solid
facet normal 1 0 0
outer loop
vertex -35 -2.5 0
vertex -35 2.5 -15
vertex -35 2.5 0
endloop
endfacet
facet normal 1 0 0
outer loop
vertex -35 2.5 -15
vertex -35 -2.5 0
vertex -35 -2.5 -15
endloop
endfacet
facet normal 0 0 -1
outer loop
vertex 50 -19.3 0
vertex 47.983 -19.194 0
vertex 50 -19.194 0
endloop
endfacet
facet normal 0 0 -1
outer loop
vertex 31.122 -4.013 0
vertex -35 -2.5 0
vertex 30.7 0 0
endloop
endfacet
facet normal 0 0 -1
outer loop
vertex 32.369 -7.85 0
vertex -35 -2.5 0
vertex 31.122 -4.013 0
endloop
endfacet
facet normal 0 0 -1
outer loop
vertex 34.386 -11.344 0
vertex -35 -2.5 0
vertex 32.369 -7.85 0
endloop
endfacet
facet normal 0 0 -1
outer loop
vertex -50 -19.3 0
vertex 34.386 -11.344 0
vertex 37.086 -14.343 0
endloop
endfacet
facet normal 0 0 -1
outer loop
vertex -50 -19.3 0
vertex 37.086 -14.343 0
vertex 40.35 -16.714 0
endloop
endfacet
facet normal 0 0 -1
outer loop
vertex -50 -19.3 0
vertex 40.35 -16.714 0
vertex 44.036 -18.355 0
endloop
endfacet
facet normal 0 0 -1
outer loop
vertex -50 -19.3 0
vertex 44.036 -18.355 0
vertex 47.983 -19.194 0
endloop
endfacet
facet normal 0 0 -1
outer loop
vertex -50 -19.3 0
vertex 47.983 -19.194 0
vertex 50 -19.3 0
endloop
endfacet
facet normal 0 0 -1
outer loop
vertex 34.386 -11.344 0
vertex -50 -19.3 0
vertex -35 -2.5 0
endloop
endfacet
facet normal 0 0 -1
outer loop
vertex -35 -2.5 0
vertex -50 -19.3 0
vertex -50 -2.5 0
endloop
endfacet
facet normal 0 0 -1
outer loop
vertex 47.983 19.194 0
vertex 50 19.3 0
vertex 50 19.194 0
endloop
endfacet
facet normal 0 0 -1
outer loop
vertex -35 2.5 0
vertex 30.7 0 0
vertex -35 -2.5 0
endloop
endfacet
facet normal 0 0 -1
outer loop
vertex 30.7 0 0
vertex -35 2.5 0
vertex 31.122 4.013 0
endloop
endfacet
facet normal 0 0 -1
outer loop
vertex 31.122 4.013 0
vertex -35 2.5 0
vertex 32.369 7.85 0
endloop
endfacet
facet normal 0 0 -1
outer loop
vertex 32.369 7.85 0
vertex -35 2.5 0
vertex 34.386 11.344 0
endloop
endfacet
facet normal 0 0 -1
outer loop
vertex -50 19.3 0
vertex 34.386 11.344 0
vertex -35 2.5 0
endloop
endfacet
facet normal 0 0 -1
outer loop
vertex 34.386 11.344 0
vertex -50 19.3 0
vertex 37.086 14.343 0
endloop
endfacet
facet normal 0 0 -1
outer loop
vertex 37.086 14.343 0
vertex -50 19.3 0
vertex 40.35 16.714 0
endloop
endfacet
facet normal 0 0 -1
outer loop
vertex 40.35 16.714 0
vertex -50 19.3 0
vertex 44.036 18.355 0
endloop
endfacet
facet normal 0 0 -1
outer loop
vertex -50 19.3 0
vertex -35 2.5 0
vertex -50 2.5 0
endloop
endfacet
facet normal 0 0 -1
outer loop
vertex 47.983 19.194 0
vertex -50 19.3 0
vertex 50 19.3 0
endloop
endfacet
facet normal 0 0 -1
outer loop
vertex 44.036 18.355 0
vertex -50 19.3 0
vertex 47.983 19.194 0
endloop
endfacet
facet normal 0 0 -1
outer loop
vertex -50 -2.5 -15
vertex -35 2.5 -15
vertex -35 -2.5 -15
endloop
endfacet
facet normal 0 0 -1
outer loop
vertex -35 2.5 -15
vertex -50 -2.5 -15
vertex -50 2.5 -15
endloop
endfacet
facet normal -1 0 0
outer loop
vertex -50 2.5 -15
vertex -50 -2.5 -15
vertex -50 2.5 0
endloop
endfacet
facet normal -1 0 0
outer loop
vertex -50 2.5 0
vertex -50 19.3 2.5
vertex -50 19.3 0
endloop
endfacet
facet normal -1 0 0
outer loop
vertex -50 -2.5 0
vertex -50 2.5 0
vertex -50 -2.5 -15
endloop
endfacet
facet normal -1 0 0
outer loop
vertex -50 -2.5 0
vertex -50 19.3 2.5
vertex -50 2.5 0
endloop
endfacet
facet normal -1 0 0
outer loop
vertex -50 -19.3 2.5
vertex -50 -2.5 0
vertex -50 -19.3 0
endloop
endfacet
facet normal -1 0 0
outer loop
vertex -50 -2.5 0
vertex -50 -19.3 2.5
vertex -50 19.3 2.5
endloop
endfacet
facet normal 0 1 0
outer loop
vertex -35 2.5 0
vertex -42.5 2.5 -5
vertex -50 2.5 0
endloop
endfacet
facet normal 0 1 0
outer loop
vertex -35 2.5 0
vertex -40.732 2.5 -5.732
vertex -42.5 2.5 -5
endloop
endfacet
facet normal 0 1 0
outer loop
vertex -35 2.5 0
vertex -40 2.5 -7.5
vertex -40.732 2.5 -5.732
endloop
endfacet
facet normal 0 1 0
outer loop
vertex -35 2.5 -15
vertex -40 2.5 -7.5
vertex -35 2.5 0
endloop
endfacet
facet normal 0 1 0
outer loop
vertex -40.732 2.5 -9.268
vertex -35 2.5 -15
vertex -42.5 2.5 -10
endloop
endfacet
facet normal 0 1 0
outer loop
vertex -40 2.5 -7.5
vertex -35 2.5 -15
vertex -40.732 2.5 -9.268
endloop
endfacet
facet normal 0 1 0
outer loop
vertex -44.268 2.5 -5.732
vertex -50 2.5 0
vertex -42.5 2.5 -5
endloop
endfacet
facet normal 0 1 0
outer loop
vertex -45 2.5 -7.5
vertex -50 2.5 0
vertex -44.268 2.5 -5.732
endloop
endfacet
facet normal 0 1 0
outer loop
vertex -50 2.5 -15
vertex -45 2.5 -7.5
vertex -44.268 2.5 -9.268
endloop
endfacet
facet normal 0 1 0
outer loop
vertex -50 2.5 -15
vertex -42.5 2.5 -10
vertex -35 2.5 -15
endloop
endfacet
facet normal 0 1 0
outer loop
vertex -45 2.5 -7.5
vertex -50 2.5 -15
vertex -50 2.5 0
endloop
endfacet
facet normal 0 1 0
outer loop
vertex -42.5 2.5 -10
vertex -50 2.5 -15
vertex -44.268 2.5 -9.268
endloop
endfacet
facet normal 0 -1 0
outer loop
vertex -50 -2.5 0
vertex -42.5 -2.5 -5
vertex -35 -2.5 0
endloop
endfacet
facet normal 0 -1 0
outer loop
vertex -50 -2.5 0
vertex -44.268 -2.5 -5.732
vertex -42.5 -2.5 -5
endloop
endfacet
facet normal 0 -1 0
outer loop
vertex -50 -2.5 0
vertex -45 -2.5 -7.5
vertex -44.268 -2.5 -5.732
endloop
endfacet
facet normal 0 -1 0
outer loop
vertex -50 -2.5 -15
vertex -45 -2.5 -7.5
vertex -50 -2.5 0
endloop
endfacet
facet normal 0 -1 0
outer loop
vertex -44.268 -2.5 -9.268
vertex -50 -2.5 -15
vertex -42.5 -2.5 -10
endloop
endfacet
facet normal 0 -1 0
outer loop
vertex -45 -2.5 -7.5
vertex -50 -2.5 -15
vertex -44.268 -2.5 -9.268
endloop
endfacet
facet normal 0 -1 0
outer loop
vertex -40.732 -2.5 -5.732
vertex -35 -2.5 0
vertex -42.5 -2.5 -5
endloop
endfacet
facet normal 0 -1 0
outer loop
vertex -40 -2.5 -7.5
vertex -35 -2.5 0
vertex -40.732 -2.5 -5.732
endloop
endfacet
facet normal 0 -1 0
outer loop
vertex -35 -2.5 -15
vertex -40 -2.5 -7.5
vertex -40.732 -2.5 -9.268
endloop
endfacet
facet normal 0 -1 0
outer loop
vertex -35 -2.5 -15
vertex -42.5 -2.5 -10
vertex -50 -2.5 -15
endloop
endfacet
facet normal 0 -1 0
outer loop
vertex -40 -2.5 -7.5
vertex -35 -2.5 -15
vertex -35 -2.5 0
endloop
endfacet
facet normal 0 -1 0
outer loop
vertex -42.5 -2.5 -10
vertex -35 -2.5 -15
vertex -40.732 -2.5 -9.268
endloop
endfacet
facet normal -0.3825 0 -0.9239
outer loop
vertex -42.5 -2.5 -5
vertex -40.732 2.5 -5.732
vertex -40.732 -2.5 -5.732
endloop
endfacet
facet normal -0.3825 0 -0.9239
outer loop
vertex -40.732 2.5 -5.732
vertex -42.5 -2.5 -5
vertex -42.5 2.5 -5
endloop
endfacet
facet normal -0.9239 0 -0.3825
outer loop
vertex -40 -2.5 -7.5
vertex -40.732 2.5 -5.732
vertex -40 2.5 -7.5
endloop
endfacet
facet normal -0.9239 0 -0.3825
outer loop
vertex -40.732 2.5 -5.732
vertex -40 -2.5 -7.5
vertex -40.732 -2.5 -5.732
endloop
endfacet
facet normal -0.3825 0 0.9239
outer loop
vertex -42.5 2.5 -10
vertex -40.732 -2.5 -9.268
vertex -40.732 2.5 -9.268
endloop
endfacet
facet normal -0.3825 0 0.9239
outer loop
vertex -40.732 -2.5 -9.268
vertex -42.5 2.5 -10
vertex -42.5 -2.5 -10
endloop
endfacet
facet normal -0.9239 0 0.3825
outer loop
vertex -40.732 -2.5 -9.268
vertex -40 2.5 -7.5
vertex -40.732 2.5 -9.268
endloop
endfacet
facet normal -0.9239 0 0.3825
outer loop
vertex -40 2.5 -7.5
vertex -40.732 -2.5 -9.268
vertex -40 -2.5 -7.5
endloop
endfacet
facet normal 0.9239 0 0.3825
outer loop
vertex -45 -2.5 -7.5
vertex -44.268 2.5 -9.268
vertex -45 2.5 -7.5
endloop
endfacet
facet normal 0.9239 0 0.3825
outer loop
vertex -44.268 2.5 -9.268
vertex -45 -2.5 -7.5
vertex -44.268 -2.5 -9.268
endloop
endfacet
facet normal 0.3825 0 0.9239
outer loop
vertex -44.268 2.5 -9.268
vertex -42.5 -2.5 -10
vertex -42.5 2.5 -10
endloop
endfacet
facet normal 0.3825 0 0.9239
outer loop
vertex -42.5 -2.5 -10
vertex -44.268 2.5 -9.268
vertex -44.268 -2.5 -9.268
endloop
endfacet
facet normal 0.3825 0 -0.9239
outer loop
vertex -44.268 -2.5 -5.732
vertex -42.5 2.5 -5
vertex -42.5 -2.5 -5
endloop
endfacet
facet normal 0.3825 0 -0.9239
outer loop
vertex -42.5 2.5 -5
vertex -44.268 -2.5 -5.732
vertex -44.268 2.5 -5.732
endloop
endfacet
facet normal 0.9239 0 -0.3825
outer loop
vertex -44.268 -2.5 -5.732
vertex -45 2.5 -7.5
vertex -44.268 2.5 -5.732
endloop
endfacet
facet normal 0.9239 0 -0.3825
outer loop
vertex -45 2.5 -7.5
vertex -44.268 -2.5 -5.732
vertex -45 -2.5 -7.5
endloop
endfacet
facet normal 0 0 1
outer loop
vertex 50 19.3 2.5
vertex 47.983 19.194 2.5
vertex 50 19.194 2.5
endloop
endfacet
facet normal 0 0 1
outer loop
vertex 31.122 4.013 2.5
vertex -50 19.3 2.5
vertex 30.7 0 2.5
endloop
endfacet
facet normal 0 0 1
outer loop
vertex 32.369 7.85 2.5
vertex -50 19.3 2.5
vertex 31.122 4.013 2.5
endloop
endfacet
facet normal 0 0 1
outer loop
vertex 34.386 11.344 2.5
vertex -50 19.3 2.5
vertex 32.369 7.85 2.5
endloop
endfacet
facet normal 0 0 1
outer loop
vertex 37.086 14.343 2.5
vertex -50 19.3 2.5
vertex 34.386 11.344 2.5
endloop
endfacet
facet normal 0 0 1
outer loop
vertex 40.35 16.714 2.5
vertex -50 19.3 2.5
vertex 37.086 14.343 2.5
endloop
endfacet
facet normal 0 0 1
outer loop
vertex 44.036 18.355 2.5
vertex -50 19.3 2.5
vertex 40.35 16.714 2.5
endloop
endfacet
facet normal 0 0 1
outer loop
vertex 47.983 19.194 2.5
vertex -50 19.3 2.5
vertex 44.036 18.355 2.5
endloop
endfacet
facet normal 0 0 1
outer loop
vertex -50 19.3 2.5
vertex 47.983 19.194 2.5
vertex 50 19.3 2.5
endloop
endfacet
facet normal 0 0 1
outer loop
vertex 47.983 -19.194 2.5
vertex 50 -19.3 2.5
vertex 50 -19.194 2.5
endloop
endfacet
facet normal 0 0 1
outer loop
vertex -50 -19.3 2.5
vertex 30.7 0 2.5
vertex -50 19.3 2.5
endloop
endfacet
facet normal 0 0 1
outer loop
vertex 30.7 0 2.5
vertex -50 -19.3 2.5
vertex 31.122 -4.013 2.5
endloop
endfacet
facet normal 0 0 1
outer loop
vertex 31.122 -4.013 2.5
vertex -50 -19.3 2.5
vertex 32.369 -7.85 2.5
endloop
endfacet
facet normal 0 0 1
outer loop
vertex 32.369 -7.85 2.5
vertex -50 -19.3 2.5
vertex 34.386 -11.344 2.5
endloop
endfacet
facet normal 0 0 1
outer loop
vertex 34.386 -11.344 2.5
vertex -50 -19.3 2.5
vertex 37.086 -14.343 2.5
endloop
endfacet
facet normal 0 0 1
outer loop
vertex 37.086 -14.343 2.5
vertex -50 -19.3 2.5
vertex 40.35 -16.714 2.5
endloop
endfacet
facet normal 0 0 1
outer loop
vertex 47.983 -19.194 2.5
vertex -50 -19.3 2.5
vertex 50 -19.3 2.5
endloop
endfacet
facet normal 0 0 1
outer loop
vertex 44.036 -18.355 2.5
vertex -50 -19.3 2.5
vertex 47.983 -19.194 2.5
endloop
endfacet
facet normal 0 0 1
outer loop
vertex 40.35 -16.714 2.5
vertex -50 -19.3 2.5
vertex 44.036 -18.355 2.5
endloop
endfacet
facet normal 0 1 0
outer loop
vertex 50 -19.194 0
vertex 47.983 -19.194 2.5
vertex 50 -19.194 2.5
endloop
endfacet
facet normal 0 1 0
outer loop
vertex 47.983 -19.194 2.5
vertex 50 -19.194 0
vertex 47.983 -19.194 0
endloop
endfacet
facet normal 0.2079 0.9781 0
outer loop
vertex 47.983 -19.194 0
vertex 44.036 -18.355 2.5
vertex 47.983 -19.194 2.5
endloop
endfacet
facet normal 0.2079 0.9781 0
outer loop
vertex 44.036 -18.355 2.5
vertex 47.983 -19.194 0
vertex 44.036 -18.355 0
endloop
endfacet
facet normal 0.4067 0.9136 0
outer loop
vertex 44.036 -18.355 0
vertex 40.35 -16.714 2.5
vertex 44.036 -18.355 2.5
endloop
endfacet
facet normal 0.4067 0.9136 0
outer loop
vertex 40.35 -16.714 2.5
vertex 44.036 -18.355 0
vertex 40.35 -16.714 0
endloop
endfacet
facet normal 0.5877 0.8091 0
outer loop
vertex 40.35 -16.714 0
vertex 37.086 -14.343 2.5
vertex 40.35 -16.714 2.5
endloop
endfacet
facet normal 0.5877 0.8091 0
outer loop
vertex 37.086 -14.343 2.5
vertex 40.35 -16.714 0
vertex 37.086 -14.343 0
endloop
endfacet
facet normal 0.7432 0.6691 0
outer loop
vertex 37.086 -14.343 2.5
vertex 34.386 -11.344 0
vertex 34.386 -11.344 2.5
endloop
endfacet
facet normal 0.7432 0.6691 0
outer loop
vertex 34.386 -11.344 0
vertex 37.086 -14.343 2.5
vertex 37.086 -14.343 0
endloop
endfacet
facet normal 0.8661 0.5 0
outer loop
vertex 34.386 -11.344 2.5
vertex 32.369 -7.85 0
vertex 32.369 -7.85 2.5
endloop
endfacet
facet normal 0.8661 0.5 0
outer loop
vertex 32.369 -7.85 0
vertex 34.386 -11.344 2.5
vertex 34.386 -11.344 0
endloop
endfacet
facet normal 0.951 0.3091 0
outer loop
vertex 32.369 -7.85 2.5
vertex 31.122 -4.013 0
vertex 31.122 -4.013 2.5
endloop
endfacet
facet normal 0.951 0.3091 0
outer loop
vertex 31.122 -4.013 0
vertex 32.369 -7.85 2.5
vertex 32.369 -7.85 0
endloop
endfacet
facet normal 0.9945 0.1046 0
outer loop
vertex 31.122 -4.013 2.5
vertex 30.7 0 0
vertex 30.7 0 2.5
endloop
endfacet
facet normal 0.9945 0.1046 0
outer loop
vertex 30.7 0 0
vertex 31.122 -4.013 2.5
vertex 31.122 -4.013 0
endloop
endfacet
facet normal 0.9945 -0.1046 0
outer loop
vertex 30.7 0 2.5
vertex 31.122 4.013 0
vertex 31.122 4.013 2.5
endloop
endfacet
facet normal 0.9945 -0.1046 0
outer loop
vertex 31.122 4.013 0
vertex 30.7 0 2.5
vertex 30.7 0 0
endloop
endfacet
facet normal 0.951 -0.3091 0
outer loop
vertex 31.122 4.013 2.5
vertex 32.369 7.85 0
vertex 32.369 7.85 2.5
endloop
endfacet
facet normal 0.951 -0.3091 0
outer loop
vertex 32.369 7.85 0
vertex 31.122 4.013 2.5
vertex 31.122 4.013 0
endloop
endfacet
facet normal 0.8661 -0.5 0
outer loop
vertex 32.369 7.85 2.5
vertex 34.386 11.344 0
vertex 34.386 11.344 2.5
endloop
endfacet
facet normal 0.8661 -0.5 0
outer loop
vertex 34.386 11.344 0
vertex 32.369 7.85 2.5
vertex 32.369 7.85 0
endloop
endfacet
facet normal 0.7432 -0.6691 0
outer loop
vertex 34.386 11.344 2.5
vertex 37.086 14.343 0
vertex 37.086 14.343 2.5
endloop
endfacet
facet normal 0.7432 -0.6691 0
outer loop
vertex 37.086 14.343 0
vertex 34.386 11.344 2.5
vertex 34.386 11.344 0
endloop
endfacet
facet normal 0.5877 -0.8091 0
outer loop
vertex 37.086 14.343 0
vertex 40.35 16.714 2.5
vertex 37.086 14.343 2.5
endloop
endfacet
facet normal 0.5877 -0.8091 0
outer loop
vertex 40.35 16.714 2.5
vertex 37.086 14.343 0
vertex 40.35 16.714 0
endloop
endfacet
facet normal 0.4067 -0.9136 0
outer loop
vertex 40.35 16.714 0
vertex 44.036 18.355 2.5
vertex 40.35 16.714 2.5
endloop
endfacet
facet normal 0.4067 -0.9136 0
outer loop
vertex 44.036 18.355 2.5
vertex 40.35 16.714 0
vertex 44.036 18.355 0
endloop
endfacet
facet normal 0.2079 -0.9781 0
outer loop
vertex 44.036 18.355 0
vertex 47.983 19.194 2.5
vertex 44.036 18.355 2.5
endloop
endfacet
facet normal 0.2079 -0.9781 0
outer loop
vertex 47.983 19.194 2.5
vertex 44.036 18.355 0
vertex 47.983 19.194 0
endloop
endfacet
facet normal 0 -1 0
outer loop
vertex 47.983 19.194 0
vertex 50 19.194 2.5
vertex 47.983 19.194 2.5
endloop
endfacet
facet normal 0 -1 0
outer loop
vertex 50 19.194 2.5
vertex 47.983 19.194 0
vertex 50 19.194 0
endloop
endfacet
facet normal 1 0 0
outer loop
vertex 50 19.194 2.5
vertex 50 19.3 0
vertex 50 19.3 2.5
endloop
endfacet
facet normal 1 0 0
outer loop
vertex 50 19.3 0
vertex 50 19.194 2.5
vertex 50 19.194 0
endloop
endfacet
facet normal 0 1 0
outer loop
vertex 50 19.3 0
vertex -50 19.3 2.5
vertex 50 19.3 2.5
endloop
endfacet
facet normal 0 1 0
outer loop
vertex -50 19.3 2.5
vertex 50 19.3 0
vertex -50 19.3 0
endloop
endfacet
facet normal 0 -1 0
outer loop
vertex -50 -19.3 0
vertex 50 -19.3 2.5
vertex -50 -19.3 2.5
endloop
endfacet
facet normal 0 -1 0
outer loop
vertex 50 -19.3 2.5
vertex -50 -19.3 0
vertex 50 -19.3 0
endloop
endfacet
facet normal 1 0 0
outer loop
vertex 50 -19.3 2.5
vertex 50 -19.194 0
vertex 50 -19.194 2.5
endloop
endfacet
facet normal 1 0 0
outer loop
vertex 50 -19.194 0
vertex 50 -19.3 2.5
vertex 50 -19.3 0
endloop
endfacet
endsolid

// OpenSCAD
// configuration
coinDiameter = 38.6;
coinThickness= 3.9;

wallThickness = 2.5;

module pusher(length){
  translate([-length/2+7.5,0,-7.5])
    difference() {
        cube([15,5,15],center=true);
        rotate([90, 0, 0])
        cylinder(r=2.5,h=9,center=true);
   }   
  linear_extrude(wallThickness){
        difference(){
            square([length,coinDiameter],true);
            translate([length/2,0,0])
                circle(d=coinDiameter);
        }
  }
}


length=100;
color("blue")
   pusher(length);
